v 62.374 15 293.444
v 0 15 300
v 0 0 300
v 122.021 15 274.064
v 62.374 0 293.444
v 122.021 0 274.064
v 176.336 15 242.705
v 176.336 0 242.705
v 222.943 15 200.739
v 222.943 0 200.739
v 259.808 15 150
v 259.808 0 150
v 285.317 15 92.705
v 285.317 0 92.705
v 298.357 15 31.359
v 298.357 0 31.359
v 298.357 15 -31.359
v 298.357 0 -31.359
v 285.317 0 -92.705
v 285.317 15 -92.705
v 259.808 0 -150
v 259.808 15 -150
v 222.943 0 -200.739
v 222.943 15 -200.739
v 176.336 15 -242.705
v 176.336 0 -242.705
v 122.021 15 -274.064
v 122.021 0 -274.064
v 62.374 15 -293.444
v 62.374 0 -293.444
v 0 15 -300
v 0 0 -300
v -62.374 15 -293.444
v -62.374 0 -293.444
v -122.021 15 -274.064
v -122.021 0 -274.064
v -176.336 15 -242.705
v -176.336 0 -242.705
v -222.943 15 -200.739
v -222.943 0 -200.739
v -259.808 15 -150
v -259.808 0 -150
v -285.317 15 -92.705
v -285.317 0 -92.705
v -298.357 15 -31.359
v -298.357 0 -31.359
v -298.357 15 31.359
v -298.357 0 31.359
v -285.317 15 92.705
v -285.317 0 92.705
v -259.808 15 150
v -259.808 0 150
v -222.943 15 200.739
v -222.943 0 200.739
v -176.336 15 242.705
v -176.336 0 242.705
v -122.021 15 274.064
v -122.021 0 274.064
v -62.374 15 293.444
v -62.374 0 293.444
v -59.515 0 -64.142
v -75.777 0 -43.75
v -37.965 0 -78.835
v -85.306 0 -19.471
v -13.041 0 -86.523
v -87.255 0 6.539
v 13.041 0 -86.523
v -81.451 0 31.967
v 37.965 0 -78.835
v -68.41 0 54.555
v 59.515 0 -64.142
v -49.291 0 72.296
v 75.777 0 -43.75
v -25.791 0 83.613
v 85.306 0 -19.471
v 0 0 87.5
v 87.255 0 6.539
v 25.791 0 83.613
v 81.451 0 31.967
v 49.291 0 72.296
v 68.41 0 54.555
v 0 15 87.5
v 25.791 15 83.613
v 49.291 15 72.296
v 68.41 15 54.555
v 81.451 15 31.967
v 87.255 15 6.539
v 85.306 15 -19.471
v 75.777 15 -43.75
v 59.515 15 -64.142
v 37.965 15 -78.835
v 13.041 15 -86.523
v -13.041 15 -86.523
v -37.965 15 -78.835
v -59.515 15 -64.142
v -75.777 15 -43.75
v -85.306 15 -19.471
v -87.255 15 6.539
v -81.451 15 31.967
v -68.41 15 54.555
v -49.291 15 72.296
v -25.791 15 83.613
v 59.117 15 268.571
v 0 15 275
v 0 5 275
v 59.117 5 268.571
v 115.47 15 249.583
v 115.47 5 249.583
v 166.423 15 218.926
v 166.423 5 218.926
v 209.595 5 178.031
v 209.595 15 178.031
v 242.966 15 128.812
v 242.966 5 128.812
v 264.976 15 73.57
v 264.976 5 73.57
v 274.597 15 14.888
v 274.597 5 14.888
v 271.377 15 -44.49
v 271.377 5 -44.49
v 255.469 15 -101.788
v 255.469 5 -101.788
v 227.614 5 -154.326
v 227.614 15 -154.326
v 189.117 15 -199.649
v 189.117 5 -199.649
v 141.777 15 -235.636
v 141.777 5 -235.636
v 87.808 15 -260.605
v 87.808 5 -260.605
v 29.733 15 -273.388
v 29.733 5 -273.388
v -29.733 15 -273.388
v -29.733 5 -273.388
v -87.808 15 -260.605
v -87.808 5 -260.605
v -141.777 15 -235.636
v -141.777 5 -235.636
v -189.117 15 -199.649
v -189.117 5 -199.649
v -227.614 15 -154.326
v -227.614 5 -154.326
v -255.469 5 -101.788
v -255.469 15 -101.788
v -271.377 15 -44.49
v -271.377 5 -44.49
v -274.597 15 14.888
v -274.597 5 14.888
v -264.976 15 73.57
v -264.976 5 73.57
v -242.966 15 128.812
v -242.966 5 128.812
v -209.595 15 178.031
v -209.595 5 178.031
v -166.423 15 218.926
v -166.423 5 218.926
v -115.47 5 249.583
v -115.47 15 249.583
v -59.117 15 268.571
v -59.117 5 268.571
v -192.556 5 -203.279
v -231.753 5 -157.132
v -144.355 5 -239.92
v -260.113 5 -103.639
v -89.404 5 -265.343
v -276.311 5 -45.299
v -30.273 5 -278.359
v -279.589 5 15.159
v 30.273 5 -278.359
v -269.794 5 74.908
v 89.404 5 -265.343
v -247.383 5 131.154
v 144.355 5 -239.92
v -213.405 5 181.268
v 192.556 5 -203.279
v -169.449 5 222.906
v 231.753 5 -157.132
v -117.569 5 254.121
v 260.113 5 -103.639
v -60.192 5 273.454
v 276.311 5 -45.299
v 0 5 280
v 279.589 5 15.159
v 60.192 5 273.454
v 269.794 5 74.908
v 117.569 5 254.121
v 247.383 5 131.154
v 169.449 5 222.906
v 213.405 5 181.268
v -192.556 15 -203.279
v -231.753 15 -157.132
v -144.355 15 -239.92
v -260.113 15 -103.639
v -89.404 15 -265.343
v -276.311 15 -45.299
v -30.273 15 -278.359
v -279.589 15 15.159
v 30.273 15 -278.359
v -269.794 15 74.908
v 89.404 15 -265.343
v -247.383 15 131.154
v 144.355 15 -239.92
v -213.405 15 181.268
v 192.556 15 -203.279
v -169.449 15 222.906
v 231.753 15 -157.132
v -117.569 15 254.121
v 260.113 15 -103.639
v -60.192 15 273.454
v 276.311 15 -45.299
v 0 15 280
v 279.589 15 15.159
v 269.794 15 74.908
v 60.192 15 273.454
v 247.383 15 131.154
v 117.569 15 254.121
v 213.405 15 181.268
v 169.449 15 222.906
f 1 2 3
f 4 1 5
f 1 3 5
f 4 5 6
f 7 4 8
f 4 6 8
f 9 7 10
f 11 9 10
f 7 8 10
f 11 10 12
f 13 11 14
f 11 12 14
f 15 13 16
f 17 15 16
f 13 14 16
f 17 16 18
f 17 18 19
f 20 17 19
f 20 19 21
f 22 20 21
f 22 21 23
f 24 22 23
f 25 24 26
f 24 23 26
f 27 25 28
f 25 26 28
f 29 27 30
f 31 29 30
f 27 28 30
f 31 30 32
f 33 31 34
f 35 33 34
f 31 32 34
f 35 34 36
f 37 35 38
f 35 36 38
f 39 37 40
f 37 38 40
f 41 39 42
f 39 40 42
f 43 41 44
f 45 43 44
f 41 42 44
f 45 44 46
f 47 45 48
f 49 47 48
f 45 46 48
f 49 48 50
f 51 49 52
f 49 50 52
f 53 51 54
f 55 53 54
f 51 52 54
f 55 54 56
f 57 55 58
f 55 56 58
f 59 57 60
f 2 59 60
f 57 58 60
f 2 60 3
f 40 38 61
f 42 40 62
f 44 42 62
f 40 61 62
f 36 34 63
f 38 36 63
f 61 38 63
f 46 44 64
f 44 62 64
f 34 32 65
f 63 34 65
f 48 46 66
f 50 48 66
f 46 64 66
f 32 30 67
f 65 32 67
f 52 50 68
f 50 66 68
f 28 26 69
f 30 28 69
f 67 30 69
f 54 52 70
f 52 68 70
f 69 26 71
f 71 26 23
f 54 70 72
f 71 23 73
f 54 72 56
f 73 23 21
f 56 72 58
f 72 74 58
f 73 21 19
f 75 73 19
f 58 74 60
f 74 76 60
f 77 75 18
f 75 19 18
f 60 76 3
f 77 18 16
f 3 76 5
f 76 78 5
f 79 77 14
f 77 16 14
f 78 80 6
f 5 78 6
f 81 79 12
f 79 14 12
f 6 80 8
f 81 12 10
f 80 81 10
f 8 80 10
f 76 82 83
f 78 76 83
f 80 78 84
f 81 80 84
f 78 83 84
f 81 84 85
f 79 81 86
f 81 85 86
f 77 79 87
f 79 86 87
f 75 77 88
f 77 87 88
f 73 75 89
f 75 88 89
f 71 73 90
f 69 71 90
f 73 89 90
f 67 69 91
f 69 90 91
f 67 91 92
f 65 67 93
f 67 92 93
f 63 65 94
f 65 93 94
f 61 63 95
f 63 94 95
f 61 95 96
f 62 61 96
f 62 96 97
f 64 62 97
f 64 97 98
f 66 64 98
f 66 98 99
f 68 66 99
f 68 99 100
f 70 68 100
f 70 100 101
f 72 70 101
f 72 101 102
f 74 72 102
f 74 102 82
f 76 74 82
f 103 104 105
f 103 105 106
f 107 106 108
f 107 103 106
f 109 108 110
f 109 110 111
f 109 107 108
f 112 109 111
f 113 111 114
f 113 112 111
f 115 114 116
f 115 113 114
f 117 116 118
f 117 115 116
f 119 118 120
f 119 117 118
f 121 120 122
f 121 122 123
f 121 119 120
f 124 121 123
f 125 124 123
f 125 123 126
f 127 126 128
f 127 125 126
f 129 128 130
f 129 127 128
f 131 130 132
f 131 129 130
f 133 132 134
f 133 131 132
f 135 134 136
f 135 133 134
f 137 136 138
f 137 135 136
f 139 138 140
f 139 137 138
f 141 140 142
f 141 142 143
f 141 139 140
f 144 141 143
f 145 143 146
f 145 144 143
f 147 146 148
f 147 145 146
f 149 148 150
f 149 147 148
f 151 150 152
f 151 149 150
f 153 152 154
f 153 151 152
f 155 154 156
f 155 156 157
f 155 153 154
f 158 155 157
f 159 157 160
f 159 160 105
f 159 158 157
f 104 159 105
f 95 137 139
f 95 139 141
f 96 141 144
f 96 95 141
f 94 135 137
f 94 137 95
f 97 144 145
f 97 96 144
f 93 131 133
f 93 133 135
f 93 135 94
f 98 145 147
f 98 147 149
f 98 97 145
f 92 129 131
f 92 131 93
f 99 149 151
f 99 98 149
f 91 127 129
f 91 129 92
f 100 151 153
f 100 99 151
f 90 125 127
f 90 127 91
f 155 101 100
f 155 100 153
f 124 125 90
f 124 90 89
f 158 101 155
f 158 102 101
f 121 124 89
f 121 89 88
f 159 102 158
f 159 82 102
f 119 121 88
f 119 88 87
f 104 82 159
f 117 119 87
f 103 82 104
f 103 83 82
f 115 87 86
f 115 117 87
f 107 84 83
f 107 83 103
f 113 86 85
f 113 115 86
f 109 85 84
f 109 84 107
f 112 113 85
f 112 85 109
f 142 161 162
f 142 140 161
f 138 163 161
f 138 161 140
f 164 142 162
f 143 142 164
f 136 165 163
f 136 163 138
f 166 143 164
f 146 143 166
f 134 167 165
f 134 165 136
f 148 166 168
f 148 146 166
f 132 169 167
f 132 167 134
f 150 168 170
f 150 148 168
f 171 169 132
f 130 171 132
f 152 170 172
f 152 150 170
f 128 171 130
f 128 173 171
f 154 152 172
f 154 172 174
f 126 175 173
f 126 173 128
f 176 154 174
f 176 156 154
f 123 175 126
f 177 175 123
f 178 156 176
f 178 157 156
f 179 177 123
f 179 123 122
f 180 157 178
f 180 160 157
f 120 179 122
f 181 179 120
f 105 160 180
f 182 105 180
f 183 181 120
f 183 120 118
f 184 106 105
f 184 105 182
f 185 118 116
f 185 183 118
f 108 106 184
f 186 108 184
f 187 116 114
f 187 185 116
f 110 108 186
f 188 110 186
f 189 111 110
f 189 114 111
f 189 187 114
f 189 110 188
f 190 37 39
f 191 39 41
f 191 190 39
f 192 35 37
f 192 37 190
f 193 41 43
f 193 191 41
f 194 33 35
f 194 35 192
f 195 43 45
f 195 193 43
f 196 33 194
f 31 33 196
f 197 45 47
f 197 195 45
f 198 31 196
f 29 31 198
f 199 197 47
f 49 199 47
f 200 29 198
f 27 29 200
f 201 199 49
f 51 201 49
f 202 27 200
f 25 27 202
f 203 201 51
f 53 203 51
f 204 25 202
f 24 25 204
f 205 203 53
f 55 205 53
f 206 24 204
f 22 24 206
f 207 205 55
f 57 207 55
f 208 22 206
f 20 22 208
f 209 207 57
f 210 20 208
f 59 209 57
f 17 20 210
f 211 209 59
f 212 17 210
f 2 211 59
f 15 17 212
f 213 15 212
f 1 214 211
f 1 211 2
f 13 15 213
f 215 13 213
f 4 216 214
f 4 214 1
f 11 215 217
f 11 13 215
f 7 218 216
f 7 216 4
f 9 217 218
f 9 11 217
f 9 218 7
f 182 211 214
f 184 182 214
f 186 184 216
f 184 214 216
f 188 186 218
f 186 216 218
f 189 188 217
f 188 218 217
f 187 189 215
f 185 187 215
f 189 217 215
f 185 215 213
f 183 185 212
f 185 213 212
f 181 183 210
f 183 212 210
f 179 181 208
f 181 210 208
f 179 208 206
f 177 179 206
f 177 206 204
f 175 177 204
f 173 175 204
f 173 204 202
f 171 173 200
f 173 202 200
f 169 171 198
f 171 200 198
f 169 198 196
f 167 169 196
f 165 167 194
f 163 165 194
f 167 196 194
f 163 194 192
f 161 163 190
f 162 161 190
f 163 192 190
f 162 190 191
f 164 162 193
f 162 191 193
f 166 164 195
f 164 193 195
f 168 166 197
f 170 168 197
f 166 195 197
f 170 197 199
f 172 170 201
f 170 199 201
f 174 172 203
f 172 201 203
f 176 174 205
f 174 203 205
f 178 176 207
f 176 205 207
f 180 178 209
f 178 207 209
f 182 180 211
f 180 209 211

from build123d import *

# Parameters (mm, degrees)
SKETCH1_R          = 300
PLATE_DEPTH        = 15
SKETCH2_R          = 87.5
BEARING_HOLE_DEPTH = 425.529150943
SKETCH4_R          = 280
SKETCH4_R_2        = 275
CUT_EXTRUDE3_DEPTH = 10


with BuildPart() as part:
    # Sketch1 → plate (new body)
    with BuildSketch(Plane(origin=(0, 0, 0), x_dir=(1, 0, 0), z_dir=(0, 1, 0))):
        with Locations(Location((0, 0, 0), (0, 0, 270))):
            Circle(SKETCH1_R)
    extrude(amount=PLATE_DEPTH)

    # Sketch2 → bearing-hole (cut, through all)
    with BuildSketch(Plane(origin=(0, 15, 0), x_dir=(1, 0, 0), z_dir=(0, 1, 0))):
        with Locations(Location((0, 0, 0), (0, 0, 270))):
            Circle(SKETCH2_R)
    extrude(amount=-BEARING_HOLE_DEPTH, mode=Mode.SUBTRACT)

    # Sketch4 → Cut-Extrude3 (cut)
    with BuildSketch(Plane(origin=(0, 15, 0), x_dir=(1, 0, 0), z_dir=(0, 1, 0))):
        with Locations(Location((0, 0, 0), (0, 0, 270))):
            Circle(SKETCH4_R)
        with Locations(Location((0, 0, 0), (0, 0, 270))):
            Circle(SKETCH4_R_2, mode=Mode.SUBTRACT)
    extrude(amount=-CUT_EXTRUDE3_DEPTH, mode=Mode.SUBTRACT)


solid = part.part
